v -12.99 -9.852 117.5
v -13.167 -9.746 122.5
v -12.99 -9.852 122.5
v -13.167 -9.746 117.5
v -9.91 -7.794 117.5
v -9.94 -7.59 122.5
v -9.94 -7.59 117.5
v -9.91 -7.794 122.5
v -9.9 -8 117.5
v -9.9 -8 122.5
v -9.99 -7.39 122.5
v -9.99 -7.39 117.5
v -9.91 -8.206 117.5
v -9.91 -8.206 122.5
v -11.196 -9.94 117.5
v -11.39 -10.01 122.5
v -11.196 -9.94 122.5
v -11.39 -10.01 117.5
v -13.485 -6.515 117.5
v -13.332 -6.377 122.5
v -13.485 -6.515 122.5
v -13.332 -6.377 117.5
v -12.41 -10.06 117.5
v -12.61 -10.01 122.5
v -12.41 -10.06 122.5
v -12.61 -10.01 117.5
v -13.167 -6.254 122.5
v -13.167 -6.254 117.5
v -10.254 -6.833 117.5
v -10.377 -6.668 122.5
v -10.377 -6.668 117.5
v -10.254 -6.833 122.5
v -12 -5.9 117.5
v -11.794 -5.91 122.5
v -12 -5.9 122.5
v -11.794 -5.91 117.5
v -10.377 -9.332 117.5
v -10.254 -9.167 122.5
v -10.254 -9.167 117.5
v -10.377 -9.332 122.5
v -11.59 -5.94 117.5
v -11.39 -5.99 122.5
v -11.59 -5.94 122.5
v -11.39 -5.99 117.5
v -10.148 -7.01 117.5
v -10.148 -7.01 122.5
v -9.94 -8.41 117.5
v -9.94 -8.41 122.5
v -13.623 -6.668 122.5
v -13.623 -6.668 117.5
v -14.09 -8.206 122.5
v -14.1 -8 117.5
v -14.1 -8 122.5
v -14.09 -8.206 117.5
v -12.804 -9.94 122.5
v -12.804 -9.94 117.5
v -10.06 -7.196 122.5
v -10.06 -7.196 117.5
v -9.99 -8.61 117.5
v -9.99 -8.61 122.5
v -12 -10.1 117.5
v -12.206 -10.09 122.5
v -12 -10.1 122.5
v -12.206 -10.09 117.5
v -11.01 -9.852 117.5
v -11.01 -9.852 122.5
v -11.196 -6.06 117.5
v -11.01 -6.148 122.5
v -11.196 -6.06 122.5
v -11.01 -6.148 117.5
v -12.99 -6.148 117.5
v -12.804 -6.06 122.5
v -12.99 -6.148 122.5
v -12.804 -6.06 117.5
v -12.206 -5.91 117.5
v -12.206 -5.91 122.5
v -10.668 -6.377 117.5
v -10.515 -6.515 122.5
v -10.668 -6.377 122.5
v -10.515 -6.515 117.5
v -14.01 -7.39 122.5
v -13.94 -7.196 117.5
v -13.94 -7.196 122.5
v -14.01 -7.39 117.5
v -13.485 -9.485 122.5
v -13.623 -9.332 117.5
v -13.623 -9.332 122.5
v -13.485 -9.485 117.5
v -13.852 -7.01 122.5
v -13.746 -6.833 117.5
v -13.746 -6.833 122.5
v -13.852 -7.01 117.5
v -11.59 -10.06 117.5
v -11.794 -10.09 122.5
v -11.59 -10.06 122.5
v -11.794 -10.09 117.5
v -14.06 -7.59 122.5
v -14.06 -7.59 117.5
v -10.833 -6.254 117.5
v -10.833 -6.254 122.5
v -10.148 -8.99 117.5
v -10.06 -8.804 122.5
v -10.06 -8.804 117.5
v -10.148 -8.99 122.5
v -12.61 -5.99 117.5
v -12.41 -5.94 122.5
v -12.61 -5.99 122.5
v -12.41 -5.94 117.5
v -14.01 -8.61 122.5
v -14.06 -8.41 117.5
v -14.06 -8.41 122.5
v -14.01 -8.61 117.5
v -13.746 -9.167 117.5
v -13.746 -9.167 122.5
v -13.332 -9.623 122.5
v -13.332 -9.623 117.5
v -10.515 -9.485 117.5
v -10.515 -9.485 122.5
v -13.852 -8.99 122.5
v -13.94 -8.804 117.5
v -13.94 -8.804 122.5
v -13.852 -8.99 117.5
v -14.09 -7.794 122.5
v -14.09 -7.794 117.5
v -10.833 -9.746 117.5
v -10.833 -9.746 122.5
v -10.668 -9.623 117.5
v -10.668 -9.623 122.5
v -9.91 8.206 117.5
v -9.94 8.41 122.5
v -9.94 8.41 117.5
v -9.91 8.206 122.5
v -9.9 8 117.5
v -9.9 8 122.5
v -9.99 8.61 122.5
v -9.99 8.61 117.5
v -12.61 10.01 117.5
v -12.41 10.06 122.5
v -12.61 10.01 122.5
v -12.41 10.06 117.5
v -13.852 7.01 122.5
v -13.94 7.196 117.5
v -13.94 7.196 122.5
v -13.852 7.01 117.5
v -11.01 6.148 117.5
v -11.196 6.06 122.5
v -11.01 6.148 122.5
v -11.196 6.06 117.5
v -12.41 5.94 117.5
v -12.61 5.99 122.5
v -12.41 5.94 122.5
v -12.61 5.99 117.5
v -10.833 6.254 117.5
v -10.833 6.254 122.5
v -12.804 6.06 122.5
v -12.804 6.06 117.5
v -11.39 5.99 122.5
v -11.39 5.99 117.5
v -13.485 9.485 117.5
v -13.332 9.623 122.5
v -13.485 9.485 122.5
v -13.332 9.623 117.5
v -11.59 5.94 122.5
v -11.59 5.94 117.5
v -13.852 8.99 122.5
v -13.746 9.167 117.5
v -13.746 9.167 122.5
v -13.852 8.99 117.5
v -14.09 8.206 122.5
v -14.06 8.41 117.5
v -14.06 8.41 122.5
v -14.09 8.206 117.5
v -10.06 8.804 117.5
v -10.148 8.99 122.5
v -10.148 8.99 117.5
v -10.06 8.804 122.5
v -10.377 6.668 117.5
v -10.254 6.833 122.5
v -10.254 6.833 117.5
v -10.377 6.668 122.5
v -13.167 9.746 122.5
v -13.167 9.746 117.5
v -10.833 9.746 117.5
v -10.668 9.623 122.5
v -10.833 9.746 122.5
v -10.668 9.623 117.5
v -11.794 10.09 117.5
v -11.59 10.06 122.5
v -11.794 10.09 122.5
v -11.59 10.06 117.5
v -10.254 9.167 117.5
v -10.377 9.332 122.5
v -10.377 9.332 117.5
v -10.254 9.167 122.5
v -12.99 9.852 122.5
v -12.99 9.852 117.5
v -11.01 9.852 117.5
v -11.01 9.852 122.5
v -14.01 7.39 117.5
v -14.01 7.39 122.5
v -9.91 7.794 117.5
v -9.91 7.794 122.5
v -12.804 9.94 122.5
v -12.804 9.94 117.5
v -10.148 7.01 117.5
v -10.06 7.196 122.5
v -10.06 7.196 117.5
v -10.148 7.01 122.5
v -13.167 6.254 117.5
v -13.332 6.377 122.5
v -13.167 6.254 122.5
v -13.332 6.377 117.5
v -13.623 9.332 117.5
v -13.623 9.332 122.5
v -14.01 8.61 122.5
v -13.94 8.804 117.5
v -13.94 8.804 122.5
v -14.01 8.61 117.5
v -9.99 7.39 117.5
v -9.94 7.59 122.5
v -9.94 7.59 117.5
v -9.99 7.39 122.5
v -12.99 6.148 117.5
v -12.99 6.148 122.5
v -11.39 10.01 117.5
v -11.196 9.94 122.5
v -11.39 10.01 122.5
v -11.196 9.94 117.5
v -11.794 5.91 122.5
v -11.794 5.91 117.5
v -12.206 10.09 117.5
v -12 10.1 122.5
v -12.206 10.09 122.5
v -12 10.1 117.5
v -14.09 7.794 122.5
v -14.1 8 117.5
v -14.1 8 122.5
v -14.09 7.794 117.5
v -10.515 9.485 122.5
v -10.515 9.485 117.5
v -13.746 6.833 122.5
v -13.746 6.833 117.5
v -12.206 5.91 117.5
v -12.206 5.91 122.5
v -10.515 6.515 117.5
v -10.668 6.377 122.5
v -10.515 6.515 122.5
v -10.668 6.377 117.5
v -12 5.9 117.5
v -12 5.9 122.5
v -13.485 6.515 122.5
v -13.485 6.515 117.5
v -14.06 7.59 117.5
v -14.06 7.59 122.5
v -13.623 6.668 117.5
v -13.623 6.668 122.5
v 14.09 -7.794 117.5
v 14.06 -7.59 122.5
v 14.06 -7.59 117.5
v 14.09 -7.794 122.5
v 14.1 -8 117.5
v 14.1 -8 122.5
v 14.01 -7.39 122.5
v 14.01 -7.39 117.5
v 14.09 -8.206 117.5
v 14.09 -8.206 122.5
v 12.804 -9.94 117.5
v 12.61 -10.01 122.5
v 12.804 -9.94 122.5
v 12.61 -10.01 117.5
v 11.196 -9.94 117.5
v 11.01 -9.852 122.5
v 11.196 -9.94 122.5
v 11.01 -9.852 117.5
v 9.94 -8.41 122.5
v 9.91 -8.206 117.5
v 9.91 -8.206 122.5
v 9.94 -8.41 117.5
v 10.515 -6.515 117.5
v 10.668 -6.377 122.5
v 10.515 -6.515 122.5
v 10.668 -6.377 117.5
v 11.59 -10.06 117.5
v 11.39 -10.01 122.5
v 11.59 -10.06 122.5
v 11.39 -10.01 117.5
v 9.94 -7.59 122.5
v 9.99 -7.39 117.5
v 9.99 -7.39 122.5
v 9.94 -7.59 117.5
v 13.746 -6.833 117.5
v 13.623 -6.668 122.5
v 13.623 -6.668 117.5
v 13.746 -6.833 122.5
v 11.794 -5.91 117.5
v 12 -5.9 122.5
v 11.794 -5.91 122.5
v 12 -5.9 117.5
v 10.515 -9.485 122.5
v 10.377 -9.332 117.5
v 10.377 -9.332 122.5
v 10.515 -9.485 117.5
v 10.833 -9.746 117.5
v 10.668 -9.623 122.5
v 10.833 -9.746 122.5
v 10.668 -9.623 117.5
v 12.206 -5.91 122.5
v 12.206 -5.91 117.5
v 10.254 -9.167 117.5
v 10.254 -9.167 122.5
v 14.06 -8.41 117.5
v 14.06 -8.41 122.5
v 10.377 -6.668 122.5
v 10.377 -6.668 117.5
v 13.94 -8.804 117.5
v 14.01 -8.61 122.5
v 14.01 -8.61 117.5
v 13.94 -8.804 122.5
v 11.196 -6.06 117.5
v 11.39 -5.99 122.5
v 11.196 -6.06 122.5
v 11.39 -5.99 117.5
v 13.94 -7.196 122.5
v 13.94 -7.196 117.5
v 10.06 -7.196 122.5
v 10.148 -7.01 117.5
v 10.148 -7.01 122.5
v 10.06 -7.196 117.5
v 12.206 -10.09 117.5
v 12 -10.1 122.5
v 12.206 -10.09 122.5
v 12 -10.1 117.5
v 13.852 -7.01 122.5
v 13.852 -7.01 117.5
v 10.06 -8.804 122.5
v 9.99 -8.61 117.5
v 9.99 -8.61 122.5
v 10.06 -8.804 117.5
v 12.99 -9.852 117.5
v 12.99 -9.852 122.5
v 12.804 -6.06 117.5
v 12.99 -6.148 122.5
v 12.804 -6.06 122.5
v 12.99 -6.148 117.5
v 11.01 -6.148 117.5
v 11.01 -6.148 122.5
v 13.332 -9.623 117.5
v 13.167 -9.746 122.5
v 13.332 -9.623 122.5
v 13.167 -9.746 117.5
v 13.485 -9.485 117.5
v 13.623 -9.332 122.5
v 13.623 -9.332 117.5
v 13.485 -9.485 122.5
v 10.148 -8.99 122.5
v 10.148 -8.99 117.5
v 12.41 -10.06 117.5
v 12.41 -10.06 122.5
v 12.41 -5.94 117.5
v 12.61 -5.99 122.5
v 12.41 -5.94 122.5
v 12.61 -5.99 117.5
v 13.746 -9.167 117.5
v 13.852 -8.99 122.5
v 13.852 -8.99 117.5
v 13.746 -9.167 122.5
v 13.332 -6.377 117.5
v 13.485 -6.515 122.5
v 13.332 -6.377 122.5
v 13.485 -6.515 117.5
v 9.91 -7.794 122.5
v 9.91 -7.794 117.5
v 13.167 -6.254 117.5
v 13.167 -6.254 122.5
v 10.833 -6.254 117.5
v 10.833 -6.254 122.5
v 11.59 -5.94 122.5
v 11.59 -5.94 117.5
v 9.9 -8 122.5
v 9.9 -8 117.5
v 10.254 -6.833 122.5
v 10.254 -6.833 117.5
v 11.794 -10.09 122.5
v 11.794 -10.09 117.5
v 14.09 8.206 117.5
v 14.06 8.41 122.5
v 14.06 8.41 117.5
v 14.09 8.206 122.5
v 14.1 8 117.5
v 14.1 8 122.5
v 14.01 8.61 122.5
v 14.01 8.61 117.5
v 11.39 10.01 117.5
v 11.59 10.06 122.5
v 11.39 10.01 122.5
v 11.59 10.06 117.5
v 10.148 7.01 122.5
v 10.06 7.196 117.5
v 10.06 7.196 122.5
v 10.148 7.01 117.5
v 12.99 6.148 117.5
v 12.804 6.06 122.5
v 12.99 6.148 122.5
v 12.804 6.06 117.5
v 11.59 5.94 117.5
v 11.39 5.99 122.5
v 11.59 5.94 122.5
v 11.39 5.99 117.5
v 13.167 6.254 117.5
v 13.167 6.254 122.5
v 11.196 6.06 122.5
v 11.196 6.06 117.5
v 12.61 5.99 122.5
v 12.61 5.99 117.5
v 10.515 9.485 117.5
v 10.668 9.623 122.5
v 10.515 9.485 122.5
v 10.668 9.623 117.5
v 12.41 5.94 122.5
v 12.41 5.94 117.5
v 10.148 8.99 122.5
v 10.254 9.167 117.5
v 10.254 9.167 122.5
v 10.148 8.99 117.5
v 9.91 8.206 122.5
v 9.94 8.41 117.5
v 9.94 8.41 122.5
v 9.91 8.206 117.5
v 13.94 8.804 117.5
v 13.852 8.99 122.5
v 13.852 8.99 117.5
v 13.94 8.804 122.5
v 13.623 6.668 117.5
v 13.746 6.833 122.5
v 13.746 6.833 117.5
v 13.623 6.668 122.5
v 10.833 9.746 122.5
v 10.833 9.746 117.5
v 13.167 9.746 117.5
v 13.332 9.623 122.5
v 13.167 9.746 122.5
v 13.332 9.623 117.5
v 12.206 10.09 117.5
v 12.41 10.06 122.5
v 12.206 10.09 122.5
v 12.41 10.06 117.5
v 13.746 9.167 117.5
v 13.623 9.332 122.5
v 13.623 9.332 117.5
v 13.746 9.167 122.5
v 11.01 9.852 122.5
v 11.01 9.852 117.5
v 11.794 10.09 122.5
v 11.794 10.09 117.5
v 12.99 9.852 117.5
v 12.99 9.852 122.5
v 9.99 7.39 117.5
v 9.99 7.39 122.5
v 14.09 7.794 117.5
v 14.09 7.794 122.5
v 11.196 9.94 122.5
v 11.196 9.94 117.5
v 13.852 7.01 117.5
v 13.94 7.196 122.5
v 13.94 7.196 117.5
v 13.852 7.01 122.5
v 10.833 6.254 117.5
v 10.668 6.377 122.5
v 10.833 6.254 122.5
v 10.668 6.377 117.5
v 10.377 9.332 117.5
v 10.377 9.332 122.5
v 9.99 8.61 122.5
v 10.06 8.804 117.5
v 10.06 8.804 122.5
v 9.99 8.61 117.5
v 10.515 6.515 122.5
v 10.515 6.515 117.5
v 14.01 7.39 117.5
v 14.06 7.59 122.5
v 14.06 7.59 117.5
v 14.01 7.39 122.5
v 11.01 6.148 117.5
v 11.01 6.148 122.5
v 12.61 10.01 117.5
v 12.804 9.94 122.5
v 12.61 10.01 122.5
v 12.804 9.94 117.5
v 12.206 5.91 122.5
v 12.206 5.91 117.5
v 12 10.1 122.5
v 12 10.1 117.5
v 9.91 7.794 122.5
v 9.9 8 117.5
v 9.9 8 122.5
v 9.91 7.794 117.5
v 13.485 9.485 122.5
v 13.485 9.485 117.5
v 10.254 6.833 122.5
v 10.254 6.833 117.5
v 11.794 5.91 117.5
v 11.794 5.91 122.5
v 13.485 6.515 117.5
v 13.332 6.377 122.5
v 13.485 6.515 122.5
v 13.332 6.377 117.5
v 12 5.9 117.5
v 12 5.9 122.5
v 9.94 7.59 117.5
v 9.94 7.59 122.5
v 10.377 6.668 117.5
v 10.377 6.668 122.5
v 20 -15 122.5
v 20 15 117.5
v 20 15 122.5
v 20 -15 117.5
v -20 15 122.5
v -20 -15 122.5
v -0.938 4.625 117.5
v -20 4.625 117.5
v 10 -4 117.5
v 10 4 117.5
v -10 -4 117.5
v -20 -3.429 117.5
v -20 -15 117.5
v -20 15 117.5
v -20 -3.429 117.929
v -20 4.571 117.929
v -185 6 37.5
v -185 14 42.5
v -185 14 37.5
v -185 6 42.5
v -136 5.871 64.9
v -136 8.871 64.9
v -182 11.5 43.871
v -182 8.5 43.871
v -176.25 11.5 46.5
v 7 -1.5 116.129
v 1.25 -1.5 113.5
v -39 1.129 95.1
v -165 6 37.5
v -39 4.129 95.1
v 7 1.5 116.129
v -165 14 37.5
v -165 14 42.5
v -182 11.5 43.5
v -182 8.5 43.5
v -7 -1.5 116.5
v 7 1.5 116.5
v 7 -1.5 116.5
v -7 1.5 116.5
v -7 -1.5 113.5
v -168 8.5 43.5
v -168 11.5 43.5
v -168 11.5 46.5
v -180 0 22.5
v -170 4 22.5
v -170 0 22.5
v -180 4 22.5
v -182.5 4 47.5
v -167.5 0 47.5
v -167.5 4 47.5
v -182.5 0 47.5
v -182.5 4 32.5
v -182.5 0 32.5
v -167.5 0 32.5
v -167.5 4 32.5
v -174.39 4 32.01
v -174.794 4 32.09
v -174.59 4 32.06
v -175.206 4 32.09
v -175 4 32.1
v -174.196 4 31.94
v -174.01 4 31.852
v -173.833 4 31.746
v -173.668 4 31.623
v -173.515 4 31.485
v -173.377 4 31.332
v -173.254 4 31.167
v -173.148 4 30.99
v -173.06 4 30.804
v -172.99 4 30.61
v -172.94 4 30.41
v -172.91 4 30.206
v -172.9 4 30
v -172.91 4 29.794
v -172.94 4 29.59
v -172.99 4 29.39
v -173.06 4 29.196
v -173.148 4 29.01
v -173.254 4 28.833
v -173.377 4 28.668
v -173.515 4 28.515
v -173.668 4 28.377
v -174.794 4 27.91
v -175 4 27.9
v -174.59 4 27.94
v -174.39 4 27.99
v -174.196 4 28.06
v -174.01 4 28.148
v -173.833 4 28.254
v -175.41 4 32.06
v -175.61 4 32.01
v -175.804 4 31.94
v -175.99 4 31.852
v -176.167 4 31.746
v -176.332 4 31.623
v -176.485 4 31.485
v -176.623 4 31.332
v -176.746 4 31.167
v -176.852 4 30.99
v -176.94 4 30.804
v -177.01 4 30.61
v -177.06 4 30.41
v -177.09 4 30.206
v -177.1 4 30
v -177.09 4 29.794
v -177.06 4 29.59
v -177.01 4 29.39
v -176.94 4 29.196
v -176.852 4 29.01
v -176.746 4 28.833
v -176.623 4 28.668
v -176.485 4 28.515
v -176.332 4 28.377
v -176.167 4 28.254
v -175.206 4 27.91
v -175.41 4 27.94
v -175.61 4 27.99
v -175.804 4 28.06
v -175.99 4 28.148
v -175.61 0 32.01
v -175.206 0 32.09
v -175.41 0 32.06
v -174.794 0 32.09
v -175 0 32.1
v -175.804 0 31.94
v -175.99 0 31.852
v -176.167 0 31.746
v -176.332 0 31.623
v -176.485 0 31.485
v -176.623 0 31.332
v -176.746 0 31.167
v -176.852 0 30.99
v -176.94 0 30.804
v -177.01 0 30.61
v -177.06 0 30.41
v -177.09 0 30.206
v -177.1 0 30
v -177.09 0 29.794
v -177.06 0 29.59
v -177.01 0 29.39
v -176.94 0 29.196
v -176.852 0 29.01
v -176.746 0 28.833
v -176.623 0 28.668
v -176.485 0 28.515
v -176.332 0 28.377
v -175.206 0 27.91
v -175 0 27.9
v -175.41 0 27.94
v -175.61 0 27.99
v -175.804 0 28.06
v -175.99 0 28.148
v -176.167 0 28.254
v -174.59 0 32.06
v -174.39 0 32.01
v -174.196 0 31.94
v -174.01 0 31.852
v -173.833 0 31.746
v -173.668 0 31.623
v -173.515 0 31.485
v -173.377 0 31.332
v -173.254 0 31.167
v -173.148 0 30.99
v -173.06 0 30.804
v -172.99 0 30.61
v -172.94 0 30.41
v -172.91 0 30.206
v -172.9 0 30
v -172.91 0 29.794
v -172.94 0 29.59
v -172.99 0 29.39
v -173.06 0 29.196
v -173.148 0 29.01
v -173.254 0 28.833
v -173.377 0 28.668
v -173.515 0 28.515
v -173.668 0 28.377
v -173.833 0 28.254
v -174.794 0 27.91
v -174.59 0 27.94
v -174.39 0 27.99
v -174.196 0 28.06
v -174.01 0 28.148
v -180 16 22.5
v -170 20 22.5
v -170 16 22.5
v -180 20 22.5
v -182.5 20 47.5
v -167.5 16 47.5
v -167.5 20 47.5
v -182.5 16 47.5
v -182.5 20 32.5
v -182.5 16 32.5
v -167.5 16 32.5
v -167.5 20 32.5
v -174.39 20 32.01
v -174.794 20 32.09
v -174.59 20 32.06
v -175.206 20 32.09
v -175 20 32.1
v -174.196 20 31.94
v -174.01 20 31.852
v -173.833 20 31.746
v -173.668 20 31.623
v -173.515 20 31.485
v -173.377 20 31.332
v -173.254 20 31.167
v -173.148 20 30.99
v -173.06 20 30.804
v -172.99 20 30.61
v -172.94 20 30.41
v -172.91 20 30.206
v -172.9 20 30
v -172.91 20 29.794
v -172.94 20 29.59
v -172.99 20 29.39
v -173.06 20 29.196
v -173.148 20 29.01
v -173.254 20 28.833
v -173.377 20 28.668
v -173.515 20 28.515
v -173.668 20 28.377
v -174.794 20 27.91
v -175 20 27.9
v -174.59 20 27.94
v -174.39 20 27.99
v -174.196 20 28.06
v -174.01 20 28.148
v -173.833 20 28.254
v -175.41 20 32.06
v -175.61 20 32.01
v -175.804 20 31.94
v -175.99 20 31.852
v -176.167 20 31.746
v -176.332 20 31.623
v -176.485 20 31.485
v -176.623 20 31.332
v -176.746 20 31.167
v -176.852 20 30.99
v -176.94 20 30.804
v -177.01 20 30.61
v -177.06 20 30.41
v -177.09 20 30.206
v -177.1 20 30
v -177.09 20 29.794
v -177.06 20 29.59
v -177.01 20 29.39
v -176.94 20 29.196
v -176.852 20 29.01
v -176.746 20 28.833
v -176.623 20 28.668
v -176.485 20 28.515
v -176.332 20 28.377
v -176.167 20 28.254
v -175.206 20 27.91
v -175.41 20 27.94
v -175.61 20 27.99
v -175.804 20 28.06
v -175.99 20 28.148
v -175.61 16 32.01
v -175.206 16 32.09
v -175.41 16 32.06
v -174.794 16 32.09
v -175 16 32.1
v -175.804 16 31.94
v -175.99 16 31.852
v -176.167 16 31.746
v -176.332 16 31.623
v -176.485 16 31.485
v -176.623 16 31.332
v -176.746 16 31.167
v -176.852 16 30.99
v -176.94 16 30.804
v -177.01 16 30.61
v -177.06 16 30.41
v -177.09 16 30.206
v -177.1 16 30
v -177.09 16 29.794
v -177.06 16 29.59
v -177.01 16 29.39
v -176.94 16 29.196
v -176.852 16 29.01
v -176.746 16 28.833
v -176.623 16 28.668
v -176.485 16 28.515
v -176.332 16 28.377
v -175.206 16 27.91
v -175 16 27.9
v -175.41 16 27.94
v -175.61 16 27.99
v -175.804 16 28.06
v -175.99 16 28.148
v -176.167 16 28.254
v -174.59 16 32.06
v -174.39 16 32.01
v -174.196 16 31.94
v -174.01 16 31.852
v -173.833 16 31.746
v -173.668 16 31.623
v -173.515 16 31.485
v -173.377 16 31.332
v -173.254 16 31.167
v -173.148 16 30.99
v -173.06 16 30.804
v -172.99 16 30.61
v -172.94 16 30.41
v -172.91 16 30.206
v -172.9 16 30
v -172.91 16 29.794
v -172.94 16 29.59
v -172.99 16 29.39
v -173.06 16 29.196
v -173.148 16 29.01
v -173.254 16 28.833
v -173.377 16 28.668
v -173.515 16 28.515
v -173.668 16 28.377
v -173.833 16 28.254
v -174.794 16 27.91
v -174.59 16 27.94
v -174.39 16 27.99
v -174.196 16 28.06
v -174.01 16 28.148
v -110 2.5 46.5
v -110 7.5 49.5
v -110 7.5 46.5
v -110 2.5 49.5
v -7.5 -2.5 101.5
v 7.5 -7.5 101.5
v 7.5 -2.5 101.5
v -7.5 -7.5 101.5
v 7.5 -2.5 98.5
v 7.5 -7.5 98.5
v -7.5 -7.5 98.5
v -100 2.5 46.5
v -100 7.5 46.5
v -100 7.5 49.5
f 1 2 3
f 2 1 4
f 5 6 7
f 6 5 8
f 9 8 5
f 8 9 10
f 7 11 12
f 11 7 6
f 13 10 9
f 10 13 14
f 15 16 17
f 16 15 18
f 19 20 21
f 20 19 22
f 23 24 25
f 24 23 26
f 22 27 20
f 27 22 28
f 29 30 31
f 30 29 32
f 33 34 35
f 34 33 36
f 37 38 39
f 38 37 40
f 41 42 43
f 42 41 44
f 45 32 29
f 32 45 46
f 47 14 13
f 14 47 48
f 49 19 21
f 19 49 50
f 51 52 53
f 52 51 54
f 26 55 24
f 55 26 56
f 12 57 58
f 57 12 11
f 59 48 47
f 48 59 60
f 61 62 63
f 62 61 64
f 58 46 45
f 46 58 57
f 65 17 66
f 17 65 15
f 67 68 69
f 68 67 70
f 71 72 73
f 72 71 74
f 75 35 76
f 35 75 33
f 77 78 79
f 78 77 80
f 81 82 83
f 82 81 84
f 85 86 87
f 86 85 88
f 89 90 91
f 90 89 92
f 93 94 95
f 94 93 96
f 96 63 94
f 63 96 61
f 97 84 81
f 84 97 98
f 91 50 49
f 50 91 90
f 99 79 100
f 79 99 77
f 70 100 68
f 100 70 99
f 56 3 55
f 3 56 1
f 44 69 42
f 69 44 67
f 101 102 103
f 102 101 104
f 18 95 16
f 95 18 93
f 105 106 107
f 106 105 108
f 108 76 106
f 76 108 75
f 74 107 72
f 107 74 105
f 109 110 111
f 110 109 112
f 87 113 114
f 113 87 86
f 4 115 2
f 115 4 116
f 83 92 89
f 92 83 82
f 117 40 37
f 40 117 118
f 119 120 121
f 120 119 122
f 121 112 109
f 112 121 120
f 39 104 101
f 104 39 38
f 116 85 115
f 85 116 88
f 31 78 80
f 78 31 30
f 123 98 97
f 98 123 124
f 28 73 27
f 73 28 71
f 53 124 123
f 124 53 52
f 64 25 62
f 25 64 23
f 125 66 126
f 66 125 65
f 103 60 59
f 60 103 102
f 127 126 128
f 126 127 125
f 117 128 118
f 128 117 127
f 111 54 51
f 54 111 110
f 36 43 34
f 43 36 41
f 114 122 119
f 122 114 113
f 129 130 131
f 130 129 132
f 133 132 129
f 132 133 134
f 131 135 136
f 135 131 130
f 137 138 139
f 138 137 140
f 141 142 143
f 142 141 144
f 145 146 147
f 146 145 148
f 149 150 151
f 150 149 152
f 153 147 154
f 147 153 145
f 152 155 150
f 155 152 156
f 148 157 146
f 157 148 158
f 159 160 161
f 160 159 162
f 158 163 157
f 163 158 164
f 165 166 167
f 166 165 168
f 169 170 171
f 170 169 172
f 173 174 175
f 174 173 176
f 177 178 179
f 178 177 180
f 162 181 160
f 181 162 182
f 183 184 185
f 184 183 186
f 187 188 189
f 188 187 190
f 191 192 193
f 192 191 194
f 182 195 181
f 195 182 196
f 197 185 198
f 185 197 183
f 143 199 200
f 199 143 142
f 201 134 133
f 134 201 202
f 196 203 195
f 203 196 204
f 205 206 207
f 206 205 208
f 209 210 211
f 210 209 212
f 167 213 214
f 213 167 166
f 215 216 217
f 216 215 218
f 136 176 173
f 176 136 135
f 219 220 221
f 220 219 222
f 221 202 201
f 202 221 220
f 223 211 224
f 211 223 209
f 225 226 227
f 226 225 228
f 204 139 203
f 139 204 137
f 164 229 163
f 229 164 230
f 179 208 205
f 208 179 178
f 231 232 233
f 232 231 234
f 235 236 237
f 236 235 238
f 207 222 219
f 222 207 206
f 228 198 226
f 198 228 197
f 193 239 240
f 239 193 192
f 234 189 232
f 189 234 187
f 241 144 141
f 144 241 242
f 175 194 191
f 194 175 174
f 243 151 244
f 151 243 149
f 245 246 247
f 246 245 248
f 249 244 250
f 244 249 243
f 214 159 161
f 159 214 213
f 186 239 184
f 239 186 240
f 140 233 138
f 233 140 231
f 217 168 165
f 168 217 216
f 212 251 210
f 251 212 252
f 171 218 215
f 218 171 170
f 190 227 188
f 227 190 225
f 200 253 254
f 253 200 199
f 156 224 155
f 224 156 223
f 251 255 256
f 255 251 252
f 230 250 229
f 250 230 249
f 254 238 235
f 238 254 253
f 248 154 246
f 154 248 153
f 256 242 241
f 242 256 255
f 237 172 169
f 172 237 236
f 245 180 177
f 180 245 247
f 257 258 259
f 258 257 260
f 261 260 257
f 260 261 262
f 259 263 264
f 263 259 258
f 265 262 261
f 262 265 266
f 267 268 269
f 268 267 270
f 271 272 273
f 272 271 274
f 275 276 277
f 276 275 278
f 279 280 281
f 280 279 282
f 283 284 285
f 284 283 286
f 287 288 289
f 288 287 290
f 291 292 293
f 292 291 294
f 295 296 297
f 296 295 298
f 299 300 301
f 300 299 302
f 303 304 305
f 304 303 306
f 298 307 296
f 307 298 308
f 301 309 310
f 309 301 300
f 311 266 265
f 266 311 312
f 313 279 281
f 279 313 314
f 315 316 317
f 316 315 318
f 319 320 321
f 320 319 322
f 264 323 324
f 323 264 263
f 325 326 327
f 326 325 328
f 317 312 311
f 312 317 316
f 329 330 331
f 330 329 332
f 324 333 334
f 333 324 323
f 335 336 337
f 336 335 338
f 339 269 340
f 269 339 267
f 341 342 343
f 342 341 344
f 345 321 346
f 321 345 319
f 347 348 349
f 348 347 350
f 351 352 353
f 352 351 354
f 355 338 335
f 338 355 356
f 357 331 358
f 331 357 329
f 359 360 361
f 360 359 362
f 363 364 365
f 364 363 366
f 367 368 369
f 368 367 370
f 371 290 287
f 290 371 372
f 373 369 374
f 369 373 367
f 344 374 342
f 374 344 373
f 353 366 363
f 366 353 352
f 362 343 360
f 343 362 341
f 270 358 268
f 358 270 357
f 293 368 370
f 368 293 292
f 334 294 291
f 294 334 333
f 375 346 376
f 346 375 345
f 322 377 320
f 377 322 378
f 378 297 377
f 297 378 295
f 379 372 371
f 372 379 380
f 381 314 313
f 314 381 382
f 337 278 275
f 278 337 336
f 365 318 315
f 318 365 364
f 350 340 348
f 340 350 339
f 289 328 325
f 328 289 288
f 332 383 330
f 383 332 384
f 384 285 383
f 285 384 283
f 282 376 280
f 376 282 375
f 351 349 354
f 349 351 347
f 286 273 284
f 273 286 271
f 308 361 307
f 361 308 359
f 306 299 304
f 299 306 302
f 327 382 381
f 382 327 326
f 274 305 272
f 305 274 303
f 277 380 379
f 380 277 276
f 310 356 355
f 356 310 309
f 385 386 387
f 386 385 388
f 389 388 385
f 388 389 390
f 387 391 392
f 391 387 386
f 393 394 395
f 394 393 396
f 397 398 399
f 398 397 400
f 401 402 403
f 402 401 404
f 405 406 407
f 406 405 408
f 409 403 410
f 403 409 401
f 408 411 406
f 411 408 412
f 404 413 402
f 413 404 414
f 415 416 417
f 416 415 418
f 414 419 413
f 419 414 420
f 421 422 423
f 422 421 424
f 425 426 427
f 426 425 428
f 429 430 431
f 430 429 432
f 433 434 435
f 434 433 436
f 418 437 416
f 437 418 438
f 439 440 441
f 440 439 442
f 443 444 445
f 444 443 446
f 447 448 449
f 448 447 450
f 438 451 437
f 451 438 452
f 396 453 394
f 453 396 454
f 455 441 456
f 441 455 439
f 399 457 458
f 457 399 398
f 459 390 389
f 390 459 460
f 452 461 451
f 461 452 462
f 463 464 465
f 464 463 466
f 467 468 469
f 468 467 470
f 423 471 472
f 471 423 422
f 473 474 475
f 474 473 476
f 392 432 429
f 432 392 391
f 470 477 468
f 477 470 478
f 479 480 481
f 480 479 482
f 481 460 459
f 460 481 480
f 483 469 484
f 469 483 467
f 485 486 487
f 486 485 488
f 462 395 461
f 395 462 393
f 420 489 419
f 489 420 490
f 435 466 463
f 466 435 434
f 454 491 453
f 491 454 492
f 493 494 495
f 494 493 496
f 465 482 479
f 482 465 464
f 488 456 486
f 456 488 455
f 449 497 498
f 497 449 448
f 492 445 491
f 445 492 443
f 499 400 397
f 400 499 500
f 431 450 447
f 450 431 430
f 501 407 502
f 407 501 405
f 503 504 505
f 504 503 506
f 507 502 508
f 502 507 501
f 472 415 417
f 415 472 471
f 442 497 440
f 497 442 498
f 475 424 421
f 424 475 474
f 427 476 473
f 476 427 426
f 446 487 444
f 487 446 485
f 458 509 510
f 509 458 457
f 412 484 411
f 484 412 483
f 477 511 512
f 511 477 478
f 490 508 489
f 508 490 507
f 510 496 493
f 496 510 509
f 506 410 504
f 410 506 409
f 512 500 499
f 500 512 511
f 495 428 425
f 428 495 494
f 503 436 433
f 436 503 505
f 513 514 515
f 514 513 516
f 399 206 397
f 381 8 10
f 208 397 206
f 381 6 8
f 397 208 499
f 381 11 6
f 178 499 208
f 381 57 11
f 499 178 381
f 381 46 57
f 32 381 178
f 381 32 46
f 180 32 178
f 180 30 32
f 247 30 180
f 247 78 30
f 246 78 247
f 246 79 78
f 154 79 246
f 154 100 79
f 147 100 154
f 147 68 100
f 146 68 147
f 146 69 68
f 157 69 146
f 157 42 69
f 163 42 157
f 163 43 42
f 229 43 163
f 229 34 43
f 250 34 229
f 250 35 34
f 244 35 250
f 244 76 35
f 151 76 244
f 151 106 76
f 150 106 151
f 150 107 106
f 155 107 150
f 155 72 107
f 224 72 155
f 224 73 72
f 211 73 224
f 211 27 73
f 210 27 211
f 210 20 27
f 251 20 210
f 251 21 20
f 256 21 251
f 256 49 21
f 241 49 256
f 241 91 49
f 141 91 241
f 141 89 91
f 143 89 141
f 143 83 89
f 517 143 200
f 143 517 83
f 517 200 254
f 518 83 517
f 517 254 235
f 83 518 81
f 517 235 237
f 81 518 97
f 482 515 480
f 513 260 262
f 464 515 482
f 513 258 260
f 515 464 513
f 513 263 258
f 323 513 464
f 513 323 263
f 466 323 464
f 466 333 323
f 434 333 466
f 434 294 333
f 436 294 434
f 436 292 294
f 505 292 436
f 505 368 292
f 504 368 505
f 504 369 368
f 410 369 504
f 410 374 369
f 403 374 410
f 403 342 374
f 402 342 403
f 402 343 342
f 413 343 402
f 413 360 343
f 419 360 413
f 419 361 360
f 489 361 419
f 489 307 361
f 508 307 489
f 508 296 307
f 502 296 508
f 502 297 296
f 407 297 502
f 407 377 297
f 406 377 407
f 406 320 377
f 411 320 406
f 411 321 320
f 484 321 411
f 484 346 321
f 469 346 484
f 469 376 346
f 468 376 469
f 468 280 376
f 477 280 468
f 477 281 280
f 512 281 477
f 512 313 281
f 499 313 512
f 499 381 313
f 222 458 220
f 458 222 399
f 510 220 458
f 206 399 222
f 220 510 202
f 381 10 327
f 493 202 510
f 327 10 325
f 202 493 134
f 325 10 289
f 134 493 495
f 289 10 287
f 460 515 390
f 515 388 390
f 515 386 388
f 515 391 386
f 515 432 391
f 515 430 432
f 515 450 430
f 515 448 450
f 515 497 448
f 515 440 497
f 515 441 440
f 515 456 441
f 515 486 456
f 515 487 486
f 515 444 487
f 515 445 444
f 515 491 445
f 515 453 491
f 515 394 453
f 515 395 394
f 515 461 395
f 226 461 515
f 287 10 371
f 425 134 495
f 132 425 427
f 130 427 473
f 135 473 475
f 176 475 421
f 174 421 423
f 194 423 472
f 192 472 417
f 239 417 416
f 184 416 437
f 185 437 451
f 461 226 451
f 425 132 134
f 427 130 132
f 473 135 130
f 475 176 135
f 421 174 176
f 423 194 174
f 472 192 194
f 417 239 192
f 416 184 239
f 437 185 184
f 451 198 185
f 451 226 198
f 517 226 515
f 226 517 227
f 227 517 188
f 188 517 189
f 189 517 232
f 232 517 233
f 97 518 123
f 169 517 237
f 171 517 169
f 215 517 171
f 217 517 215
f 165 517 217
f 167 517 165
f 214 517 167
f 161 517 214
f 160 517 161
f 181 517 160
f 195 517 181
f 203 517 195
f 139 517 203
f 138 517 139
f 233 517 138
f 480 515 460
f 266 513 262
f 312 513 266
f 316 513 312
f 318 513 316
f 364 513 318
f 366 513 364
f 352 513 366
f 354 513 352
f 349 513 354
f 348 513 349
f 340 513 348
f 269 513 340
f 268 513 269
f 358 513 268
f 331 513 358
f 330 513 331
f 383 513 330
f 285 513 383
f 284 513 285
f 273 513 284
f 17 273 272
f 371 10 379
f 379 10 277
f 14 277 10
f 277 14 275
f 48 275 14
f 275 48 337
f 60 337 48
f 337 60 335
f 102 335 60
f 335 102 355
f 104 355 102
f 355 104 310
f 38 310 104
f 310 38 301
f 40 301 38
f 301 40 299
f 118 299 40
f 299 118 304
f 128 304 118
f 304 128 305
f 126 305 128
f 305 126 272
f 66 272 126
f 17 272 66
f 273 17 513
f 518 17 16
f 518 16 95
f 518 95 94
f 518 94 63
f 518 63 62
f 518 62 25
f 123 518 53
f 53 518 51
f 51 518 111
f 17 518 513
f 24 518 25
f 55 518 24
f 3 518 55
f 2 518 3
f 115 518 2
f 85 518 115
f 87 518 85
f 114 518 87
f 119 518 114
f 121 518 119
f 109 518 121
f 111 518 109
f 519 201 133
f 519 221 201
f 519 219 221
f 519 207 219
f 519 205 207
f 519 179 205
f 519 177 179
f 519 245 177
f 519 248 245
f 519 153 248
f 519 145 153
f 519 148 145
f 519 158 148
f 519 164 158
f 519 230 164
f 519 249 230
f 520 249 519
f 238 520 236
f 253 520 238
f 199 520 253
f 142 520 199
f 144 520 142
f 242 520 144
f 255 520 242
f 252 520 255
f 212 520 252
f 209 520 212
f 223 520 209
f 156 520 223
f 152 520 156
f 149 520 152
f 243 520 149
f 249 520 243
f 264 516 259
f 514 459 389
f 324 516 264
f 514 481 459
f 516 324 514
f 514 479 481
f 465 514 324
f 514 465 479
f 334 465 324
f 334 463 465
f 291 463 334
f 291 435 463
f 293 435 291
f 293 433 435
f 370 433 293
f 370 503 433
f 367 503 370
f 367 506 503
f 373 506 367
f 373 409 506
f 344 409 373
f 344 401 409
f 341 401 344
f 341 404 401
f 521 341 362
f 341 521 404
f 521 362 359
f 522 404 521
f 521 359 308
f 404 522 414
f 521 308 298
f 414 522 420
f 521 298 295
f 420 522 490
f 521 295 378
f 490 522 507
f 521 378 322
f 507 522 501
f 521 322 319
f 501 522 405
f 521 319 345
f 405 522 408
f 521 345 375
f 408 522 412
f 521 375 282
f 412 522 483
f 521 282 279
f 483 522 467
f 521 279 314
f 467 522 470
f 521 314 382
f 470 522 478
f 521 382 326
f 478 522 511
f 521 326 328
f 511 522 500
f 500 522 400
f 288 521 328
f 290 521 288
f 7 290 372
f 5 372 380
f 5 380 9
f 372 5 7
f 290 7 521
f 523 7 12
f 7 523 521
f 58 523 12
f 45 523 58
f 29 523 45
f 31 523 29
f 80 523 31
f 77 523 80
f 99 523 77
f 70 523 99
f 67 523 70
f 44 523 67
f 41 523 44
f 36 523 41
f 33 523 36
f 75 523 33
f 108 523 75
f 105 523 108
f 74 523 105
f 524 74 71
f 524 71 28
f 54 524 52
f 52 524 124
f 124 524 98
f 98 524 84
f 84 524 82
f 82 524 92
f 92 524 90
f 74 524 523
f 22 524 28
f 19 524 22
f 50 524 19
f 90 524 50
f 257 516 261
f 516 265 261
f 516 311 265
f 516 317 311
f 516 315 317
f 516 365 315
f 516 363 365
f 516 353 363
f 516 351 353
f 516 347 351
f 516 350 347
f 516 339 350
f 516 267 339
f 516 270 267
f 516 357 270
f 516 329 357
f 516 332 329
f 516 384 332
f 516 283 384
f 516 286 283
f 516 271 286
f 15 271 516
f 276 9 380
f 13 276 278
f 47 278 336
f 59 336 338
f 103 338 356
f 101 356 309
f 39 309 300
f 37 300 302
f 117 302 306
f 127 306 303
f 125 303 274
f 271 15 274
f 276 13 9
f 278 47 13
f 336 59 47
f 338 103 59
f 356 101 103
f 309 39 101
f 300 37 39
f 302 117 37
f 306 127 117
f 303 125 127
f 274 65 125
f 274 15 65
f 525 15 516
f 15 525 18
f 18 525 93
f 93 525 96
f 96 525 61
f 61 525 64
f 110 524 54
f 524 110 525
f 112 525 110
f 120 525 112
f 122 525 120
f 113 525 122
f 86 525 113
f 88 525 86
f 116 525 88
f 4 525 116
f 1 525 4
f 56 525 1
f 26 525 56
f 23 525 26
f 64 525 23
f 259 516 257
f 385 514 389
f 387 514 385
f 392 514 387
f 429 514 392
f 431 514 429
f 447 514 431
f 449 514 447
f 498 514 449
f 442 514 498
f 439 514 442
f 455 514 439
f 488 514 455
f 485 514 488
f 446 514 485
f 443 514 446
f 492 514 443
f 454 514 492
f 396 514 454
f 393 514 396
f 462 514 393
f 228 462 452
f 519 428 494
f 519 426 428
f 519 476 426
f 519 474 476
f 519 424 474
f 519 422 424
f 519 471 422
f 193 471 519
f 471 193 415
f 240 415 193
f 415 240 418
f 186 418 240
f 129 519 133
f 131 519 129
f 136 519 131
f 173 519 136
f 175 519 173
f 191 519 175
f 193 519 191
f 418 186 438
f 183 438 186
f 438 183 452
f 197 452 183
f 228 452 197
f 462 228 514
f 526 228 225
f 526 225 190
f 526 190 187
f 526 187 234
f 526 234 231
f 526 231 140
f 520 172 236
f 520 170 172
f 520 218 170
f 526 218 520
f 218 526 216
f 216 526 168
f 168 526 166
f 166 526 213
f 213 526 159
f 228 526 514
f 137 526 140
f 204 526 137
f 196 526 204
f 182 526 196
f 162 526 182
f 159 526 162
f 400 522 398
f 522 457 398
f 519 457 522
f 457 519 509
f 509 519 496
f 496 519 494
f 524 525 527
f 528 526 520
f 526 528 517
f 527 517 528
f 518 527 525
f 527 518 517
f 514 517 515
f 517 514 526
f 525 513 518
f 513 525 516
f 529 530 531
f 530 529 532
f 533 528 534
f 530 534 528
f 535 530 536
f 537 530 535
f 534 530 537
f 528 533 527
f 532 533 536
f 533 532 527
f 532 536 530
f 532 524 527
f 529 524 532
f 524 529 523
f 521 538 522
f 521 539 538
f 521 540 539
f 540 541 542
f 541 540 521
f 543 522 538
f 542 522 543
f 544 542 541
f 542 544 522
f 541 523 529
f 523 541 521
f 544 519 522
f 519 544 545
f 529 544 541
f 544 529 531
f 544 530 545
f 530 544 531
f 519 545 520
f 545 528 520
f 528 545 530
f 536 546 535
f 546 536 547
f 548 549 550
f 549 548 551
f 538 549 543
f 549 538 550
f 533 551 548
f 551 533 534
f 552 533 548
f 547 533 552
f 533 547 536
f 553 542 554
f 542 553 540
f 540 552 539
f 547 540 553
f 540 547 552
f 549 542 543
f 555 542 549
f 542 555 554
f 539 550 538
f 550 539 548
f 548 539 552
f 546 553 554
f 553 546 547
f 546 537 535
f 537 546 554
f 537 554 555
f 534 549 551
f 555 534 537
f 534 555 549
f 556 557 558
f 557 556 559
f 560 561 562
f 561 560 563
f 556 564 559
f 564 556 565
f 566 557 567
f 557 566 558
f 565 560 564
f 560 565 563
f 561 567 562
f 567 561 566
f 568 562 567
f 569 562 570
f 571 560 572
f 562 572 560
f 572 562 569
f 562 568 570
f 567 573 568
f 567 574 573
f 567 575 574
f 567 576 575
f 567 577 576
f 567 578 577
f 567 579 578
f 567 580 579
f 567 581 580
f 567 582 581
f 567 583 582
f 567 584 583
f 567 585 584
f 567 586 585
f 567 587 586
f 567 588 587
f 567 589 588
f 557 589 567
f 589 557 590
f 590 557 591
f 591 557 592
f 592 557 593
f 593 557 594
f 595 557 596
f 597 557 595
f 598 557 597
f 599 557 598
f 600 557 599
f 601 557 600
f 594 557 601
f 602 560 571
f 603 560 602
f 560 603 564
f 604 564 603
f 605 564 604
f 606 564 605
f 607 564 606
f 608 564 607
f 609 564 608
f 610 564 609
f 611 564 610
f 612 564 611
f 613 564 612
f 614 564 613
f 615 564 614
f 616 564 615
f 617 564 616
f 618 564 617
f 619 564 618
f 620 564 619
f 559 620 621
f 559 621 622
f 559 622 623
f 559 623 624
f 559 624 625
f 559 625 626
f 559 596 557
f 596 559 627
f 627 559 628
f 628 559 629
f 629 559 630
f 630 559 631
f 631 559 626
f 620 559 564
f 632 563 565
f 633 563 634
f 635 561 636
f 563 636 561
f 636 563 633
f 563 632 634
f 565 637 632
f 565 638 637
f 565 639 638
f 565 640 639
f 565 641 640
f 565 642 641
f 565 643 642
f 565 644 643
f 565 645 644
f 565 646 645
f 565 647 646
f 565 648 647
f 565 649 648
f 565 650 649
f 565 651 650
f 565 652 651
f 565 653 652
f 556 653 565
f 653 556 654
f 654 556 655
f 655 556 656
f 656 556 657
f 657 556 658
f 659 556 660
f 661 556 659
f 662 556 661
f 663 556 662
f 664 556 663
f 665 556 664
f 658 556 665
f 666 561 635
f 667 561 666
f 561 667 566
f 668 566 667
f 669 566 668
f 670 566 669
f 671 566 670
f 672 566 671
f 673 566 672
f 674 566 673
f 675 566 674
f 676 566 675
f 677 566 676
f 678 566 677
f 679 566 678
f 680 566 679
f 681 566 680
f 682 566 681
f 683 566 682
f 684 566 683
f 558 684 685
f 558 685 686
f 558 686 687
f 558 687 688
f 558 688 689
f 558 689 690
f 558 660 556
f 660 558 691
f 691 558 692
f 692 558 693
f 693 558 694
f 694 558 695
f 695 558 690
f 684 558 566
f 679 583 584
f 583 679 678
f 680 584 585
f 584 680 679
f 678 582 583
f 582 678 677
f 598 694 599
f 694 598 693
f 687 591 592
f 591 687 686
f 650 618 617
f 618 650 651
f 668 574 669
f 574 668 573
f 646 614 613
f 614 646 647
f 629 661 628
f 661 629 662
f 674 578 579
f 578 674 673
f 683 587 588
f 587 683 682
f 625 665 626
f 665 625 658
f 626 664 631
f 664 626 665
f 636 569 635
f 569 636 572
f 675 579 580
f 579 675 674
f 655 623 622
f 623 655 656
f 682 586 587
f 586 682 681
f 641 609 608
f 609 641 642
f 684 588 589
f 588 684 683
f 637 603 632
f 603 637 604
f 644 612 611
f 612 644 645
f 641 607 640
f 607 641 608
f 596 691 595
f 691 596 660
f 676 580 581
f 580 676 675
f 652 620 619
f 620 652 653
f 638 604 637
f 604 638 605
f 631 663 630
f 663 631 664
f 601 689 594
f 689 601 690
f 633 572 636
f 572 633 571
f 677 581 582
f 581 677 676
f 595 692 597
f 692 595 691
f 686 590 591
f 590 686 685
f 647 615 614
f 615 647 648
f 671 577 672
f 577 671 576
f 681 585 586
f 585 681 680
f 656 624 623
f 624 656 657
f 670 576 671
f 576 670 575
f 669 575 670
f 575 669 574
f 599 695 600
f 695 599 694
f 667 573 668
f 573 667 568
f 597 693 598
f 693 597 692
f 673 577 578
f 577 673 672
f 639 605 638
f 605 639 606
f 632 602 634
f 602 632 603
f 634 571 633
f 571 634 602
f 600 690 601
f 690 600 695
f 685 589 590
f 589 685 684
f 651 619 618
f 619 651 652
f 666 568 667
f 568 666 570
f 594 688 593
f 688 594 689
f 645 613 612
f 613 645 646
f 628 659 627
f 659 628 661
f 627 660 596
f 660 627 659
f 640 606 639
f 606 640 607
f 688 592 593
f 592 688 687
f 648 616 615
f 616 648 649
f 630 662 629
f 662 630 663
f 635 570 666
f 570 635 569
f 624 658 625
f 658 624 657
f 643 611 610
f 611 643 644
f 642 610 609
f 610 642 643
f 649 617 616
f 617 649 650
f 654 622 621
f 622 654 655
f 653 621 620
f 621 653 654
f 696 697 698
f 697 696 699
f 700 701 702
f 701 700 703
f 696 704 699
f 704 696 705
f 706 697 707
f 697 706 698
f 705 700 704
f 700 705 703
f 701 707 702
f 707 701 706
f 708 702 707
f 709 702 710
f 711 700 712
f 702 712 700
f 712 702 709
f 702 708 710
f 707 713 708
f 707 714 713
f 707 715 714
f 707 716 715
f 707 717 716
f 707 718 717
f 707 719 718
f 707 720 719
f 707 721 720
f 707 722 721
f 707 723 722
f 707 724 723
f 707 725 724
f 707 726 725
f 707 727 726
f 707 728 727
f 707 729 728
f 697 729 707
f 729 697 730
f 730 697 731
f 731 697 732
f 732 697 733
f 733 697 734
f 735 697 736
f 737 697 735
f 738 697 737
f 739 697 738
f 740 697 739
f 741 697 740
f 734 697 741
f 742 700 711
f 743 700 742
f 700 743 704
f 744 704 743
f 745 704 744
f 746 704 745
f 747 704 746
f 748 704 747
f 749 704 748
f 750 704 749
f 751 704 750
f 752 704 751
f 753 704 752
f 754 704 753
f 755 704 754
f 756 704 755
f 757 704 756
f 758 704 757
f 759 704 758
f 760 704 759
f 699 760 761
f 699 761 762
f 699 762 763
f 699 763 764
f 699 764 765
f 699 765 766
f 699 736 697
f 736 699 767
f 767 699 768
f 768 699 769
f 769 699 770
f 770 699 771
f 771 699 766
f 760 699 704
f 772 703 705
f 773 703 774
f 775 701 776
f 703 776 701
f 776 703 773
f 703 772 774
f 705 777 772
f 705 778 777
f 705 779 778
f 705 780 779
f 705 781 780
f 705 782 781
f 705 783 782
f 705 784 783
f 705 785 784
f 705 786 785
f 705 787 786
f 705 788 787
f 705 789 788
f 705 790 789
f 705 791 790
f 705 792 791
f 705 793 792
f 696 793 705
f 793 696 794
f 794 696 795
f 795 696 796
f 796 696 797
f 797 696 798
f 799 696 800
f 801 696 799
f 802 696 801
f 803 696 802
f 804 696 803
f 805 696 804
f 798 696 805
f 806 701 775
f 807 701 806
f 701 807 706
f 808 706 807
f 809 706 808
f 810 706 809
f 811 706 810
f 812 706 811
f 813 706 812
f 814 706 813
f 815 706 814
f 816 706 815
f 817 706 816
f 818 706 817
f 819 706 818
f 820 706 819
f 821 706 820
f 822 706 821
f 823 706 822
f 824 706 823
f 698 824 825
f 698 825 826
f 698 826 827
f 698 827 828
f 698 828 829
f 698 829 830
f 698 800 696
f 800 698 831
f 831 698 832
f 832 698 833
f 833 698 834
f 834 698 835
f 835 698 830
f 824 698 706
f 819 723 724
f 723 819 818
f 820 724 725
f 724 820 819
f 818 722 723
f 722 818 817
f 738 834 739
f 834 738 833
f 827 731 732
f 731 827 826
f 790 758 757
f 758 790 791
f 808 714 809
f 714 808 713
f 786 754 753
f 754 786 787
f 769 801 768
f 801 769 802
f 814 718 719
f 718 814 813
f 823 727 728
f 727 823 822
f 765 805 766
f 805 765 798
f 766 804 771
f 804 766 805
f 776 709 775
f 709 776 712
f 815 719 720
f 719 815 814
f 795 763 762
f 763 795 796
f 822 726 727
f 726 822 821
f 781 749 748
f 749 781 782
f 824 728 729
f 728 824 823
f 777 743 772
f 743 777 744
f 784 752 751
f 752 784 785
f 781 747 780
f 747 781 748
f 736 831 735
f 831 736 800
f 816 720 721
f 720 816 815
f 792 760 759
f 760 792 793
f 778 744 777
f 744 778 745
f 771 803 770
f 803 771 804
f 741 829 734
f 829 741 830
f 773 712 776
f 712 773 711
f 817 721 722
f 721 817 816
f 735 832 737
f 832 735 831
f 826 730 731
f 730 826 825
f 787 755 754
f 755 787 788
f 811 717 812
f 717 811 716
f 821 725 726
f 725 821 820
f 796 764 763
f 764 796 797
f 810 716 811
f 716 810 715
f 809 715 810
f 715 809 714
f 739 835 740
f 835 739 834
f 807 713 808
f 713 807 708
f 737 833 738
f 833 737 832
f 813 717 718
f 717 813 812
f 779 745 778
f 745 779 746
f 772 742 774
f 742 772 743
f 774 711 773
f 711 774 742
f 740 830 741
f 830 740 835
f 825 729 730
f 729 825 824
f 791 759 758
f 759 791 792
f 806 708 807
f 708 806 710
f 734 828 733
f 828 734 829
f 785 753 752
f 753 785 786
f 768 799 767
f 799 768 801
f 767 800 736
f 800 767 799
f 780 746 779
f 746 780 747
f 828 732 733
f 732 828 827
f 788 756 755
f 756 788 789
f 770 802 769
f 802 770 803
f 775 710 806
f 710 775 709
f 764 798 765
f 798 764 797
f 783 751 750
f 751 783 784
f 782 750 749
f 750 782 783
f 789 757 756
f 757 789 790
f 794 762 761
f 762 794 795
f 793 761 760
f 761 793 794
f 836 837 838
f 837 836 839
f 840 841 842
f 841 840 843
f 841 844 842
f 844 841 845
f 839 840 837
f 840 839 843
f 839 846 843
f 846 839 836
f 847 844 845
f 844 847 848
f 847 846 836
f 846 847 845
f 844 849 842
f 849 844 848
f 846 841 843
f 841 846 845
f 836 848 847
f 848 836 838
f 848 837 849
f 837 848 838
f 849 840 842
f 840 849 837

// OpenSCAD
// Hlavní noha podvozku (levá/pravá)
// Odpružená noha s uchycením kolečka ø80mm
// Rozchod: 350mm -> každá noha ~175mm od osy
// Material: PET-G, 30% výplň, 5 perimetrů

$fn = 64;

strana = "L"; // "L" nebo "P"
vyska = 120; // výška nohy
sirka_uchyt = 40; // šířka uchycení k trupu
rozchod_polovina = 175; // vzdálenost od osy
prumer_kola = 80;
osa_kola = 4; // mm průměr osy

mirror_factor = (strana == "L") ? -1 : 1;

module hlavni_noha() {
    // Horní úchyt k trupu
    translate([0, 0, vyska])
        uchyt_k_trupu();

    // Noha - mírně zakřivená dozadu pro odpružení
    difference() {
        hull() {
            // Horní bod (u trupu)
            translate([0, 0, vyska])
                cube([20, 8, 5], center=true);
            // Spodní bod (u kola) - odsazený do strany
            translate([mirror_factor * rozchod_polovina, 10, prumer_kola/2])
                cube([20, 8, 5], center=true);
        }
        // Odlehčení - dutina uvnitř
        hull() {
            translate([0, 0, vyska - 5])
                cube([14, 3, 3], center=true);
            translate([mirror_factor * rozchod_polovina, 10, prumer_kola/2 + 5])
                cube([14, 3, 3], center=true);
        }
    }

    // Vzpěra pro tuhost
    hull() {
        translate([0, -5, vyska - 20])
            cube([15, 5, 3], center=true);
        translate([mirror_factor * rozchod_polovina * 0.6, 5, vyska * 0.4])
            cube([10, 5, 3], center=true);
    }

    // Vidlice pro kolo
    translate([mirror_factor * rozchod_polovina, 10, prumer_kola/2])
        vidlice_kola();
}

module uchyt_k_trupu() {
    difference() {
        // Montážní deska
        cube([sirka_uchyt, 30, 5], center=true);
        // 4x M4 šrouby
        for (x = [-1, 1]) {
            for (y = [-1, 1]) {
                translate([x * 12, y * 8, -3])
                    cylinder(d=4.2, h=8);
            }
        }
    }
}

module vidlice_kola() {
    // Dvě ramena vidlice
    for (y_off = [-1, 1]) {
        translate([0, y_off * 8, 0])
            difference() {
                hull() {
                    cube([15, 4, 15], center=true);
                    translate([0, 0, -15])
                        cube([10, 4, 5], center=true);
                }
                // Otvor pro osu kola
                translate([0, 0, -10])
                    rotate([90, 0, 0])
                        cylinder(d=osa_kola + 0.2, h=10, center=true);
            }
    }
}

hlavni_noha();
